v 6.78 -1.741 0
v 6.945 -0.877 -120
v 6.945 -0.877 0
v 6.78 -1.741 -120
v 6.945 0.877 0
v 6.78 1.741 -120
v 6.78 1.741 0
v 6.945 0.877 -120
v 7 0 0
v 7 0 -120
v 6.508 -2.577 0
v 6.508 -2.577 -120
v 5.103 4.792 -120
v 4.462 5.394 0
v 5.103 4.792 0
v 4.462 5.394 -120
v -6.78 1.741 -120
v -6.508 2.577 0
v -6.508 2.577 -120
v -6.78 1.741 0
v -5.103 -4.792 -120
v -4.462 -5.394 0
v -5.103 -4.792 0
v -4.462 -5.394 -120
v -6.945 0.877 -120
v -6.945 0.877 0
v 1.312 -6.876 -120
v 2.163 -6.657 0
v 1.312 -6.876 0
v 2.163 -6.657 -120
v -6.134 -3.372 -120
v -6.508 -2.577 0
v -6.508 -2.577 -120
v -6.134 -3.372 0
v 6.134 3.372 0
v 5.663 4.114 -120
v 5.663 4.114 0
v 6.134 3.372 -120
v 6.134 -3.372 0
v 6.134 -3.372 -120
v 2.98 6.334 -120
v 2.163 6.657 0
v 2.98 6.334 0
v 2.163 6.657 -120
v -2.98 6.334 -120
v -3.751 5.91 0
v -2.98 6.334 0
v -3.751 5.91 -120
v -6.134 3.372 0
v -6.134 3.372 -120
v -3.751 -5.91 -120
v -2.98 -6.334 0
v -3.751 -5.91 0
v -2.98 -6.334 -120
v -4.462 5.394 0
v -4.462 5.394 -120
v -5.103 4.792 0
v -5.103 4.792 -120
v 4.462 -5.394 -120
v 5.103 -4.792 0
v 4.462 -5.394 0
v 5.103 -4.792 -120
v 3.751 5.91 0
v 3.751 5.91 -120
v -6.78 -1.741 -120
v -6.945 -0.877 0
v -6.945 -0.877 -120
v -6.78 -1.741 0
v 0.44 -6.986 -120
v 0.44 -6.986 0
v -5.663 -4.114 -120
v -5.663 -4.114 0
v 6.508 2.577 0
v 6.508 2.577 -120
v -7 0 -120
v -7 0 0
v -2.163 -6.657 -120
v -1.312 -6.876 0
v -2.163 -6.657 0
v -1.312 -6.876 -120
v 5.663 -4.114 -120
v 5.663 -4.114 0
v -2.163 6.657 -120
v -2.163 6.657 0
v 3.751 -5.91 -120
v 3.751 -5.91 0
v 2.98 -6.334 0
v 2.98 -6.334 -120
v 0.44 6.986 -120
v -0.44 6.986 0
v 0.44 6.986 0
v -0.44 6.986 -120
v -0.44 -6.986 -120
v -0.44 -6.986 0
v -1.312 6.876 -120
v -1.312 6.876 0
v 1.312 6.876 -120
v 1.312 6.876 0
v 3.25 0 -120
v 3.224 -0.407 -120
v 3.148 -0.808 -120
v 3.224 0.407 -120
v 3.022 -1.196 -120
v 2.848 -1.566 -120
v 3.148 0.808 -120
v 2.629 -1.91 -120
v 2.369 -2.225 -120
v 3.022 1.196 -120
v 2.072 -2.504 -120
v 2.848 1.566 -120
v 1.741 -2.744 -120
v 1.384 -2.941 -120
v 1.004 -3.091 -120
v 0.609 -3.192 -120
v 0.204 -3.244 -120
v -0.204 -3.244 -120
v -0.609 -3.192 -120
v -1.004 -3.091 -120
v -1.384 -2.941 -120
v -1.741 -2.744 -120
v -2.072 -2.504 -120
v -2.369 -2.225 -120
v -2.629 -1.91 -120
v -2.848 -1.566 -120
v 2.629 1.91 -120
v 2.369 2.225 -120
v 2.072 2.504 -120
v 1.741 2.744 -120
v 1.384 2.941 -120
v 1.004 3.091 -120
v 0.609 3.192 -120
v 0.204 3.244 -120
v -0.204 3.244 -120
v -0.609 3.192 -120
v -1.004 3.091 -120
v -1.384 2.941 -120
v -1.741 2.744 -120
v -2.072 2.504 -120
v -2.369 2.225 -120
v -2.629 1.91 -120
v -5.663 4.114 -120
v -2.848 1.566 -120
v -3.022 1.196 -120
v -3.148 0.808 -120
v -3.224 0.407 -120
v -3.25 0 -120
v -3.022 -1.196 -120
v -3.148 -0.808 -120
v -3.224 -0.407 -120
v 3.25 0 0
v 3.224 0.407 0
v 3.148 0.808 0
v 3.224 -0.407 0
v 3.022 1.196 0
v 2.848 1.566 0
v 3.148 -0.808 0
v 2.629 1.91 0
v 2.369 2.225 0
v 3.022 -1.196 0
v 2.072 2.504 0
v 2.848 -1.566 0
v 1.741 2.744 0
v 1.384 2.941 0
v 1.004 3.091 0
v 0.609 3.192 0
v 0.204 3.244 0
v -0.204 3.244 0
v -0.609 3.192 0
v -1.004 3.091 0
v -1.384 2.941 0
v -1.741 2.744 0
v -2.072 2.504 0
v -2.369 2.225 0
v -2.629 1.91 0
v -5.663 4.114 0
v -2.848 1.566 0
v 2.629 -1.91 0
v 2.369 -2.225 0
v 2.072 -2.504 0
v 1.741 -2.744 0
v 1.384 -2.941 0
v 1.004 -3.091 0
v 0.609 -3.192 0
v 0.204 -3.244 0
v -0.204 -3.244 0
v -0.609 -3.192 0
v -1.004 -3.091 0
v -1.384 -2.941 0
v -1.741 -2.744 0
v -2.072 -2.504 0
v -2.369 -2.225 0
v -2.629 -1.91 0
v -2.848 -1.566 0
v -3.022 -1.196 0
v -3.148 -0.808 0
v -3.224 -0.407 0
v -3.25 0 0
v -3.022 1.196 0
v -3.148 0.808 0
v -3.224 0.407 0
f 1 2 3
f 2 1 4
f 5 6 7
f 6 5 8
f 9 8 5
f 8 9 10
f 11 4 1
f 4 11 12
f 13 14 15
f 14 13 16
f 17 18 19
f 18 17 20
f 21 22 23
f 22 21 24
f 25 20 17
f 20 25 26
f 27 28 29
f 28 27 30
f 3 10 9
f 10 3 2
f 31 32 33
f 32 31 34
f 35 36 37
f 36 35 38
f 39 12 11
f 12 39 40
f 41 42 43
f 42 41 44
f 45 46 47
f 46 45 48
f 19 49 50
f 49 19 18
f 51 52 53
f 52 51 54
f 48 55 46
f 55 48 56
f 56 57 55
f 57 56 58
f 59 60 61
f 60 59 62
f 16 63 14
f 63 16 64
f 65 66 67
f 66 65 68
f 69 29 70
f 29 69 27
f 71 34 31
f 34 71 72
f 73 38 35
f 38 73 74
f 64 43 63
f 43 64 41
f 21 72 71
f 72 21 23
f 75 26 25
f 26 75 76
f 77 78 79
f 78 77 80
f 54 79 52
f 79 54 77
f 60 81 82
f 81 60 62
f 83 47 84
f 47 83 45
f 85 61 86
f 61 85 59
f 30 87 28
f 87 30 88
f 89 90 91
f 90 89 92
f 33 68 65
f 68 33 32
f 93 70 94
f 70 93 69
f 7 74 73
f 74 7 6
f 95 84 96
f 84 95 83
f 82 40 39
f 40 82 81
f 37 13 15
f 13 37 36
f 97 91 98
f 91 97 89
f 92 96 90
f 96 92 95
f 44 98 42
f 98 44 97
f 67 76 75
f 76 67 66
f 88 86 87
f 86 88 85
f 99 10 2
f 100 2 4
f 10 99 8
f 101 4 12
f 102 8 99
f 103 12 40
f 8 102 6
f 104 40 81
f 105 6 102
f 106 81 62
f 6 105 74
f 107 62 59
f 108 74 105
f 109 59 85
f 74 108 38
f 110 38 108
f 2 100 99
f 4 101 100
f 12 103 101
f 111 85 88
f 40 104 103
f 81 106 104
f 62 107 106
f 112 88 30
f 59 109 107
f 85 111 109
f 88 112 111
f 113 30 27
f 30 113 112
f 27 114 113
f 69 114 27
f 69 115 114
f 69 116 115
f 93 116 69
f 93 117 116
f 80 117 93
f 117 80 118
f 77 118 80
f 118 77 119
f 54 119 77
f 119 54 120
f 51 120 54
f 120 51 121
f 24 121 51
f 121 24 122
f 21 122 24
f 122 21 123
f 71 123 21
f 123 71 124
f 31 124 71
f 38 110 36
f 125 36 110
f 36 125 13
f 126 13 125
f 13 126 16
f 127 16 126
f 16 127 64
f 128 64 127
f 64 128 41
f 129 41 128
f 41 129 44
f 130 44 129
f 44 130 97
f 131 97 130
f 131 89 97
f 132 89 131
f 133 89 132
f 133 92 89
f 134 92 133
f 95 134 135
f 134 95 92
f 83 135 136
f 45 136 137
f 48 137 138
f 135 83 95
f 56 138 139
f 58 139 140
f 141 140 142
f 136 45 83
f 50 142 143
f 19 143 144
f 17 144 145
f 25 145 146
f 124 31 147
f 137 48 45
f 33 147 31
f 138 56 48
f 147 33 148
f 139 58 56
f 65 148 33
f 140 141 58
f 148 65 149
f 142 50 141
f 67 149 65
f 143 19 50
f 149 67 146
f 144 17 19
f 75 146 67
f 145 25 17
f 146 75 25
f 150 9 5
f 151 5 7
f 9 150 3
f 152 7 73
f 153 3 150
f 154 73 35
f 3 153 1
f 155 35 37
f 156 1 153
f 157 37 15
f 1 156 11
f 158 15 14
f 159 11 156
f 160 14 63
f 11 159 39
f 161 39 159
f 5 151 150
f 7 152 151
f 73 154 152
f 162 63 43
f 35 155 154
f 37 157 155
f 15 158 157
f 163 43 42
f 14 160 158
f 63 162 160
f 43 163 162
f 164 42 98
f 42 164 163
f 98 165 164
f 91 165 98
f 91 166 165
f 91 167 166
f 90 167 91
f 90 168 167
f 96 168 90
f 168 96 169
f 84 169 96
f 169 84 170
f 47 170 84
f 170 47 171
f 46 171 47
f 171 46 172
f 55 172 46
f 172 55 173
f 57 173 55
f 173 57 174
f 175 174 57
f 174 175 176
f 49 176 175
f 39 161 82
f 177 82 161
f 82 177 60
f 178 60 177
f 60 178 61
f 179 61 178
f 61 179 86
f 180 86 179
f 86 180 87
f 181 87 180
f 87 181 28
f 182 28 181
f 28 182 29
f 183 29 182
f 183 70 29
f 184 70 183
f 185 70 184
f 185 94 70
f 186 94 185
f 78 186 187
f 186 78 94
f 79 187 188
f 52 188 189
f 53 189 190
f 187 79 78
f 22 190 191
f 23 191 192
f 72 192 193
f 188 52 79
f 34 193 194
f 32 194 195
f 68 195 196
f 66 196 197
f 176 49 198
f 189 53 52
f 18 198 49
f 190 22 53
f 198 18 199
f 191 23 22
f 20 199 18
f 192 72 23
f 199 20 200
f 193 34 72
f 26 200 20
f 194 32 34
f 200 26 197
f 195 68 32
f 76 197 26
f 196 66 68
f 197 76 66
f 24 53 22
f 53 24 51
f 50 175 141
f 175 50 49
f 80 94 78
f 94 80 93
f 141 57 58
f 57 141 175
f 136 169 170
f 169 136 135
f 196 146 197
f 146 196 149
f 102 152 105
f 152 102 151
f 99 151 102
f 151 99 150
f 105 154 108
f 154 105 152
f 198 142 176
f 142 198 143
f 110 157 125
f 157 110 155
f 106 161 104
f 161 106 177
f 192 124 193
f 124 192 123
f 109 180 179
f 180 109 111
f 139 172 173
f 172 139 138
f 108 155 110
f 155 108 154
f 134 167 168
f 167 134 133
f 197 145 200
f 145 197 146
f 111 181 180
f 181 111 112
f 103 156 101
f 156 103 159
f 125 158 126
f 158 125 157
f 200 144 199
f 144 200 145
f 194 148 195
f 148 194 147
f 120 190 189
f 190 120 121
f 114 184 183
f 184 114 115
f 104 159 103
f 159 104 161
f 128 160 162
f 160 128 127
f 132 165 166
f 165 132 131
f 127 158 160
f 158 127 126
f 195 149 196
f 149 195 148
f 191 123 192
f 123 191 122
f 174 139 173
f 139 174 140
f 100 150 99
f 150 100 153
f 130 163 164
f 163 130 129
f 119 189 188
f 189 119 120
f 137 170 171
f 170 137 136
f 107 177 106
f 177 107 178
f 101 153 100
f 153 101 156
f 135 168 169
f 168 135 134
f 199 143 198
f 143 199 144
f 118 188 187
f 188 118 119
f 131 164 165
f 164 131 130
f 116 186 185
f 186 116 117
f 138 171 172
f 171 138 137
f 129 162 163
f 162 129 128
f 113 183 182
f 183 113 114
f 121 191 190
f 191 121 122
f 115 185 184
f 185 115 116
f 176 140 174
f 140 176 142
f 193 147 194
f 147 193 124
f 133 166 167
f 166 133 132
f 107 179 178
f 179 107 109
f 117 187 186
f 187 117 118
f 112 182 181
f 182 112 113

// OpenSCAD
$fn = 50;


difference() {
	union() {
		translate(v = [0, 0, -120.0000000000]) {
			cylinder(h = 120, r = 7.0000000000);
		}
	}
	union() {
		#translate(v = [0, 0, -120]) {
			cylinder(h = 120, r = 3.2500000000);
		}
	}
}
